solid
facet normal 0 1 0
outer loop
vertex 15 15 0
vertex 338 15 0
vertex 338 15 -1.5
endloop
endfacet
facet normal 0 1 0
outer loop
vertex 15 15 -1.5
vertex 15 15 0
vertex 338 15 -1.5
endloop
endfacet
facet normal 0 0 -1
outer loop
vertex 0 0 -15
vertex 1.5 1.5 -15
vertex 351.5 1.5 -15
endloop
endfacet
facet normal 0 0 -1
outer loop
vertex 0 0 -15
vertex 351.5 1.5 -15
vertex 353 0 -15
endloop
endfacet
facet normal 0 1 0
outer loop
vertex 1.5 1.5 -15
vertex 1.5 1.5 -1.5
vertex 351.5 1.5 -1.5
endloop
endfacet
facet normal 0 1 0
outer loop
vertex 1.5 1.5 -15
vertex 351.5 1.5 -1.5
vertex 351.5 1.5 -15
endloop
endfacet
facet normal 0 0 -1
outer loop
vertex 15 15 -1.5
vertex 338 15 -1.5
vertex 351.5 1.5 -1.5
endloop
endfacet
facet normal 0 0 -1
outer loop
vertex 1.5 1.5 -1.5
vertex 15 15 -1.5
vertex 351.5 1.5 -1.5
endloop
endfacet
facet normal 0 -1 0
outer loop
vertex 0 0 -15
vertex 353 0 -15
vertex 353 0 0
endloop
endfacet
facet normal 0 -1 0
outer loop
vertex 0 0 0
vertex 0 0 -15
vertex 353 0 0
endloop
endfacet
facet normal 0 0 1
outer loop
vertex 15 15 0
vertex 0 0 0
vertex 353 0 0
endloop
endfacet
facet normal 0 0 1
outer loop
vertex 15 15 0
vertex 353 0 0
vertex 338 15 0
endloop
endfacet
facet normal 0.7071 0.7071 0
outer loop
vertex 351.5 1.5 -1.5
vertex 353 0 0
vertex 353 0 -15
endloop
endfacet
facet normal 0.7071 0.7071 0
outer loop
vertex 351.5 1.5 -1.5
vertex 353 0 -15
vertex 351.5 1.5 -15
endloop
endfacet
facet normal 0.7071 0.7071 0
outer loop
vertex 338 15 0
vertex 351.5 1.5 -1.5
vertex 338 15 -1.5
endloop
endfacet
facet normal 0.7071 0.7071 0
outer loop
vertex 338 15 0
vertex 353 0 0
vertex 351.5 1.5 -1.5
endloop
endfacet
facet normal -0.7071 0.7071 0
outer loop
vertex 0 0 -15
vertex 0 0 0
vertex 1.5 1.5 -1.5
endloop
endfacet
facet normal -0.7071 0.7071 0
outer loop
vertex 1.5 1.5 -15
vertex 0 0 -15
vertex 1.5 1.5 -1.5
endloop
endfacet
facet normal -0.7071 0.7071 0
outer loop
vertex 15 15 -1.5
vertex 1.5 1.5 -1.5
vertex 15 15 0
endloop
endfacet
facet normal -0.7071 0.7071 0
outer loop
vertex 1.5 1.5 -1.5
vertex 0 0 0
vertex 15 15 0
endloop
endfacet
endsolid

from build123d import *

# Parameters (mm, degrees)
EXTRUDE_1_DEPTH     = 353
CUT_EXTRUDE_1_DEPTH = 16


with BuildPart() as part:
    # Эскиз1 → Бобышка-Вытянуть1 (new body)
    with BuildSketch(Plane(origin=(0, 0, 0), x_dir=(0, 0, -1), z_dir=(1, 0, 0))):
        Polygon((0, 0), (0, 15), (1.5, 15), (1.5, 1.5), (15, 1.5), (15, 0), align=None)
    extrude(amount=EXTRUDE_1_DEPTH)

    # Эскиз2 → Вырез-Вытянуть1 (cut, through all)
    with BuildSketch(Plane.XY):
        Polygon((0, 0), (21.729873861, 21.729873861), (0, 21.729873861), align=None)
    cut_extrude_1 = extrude(amount=-CUT_EXTRUDE_1_DEPTH, mode=Mode.SUBTRACT)

    # Зеркальное отражение1: Вырез-Вытянуть1 across plane
    add(cut_extrude_1.mirror(Plane.ZY.offset(-176.5)), mode=Mode.SUBTRACT)


solid = part.part
